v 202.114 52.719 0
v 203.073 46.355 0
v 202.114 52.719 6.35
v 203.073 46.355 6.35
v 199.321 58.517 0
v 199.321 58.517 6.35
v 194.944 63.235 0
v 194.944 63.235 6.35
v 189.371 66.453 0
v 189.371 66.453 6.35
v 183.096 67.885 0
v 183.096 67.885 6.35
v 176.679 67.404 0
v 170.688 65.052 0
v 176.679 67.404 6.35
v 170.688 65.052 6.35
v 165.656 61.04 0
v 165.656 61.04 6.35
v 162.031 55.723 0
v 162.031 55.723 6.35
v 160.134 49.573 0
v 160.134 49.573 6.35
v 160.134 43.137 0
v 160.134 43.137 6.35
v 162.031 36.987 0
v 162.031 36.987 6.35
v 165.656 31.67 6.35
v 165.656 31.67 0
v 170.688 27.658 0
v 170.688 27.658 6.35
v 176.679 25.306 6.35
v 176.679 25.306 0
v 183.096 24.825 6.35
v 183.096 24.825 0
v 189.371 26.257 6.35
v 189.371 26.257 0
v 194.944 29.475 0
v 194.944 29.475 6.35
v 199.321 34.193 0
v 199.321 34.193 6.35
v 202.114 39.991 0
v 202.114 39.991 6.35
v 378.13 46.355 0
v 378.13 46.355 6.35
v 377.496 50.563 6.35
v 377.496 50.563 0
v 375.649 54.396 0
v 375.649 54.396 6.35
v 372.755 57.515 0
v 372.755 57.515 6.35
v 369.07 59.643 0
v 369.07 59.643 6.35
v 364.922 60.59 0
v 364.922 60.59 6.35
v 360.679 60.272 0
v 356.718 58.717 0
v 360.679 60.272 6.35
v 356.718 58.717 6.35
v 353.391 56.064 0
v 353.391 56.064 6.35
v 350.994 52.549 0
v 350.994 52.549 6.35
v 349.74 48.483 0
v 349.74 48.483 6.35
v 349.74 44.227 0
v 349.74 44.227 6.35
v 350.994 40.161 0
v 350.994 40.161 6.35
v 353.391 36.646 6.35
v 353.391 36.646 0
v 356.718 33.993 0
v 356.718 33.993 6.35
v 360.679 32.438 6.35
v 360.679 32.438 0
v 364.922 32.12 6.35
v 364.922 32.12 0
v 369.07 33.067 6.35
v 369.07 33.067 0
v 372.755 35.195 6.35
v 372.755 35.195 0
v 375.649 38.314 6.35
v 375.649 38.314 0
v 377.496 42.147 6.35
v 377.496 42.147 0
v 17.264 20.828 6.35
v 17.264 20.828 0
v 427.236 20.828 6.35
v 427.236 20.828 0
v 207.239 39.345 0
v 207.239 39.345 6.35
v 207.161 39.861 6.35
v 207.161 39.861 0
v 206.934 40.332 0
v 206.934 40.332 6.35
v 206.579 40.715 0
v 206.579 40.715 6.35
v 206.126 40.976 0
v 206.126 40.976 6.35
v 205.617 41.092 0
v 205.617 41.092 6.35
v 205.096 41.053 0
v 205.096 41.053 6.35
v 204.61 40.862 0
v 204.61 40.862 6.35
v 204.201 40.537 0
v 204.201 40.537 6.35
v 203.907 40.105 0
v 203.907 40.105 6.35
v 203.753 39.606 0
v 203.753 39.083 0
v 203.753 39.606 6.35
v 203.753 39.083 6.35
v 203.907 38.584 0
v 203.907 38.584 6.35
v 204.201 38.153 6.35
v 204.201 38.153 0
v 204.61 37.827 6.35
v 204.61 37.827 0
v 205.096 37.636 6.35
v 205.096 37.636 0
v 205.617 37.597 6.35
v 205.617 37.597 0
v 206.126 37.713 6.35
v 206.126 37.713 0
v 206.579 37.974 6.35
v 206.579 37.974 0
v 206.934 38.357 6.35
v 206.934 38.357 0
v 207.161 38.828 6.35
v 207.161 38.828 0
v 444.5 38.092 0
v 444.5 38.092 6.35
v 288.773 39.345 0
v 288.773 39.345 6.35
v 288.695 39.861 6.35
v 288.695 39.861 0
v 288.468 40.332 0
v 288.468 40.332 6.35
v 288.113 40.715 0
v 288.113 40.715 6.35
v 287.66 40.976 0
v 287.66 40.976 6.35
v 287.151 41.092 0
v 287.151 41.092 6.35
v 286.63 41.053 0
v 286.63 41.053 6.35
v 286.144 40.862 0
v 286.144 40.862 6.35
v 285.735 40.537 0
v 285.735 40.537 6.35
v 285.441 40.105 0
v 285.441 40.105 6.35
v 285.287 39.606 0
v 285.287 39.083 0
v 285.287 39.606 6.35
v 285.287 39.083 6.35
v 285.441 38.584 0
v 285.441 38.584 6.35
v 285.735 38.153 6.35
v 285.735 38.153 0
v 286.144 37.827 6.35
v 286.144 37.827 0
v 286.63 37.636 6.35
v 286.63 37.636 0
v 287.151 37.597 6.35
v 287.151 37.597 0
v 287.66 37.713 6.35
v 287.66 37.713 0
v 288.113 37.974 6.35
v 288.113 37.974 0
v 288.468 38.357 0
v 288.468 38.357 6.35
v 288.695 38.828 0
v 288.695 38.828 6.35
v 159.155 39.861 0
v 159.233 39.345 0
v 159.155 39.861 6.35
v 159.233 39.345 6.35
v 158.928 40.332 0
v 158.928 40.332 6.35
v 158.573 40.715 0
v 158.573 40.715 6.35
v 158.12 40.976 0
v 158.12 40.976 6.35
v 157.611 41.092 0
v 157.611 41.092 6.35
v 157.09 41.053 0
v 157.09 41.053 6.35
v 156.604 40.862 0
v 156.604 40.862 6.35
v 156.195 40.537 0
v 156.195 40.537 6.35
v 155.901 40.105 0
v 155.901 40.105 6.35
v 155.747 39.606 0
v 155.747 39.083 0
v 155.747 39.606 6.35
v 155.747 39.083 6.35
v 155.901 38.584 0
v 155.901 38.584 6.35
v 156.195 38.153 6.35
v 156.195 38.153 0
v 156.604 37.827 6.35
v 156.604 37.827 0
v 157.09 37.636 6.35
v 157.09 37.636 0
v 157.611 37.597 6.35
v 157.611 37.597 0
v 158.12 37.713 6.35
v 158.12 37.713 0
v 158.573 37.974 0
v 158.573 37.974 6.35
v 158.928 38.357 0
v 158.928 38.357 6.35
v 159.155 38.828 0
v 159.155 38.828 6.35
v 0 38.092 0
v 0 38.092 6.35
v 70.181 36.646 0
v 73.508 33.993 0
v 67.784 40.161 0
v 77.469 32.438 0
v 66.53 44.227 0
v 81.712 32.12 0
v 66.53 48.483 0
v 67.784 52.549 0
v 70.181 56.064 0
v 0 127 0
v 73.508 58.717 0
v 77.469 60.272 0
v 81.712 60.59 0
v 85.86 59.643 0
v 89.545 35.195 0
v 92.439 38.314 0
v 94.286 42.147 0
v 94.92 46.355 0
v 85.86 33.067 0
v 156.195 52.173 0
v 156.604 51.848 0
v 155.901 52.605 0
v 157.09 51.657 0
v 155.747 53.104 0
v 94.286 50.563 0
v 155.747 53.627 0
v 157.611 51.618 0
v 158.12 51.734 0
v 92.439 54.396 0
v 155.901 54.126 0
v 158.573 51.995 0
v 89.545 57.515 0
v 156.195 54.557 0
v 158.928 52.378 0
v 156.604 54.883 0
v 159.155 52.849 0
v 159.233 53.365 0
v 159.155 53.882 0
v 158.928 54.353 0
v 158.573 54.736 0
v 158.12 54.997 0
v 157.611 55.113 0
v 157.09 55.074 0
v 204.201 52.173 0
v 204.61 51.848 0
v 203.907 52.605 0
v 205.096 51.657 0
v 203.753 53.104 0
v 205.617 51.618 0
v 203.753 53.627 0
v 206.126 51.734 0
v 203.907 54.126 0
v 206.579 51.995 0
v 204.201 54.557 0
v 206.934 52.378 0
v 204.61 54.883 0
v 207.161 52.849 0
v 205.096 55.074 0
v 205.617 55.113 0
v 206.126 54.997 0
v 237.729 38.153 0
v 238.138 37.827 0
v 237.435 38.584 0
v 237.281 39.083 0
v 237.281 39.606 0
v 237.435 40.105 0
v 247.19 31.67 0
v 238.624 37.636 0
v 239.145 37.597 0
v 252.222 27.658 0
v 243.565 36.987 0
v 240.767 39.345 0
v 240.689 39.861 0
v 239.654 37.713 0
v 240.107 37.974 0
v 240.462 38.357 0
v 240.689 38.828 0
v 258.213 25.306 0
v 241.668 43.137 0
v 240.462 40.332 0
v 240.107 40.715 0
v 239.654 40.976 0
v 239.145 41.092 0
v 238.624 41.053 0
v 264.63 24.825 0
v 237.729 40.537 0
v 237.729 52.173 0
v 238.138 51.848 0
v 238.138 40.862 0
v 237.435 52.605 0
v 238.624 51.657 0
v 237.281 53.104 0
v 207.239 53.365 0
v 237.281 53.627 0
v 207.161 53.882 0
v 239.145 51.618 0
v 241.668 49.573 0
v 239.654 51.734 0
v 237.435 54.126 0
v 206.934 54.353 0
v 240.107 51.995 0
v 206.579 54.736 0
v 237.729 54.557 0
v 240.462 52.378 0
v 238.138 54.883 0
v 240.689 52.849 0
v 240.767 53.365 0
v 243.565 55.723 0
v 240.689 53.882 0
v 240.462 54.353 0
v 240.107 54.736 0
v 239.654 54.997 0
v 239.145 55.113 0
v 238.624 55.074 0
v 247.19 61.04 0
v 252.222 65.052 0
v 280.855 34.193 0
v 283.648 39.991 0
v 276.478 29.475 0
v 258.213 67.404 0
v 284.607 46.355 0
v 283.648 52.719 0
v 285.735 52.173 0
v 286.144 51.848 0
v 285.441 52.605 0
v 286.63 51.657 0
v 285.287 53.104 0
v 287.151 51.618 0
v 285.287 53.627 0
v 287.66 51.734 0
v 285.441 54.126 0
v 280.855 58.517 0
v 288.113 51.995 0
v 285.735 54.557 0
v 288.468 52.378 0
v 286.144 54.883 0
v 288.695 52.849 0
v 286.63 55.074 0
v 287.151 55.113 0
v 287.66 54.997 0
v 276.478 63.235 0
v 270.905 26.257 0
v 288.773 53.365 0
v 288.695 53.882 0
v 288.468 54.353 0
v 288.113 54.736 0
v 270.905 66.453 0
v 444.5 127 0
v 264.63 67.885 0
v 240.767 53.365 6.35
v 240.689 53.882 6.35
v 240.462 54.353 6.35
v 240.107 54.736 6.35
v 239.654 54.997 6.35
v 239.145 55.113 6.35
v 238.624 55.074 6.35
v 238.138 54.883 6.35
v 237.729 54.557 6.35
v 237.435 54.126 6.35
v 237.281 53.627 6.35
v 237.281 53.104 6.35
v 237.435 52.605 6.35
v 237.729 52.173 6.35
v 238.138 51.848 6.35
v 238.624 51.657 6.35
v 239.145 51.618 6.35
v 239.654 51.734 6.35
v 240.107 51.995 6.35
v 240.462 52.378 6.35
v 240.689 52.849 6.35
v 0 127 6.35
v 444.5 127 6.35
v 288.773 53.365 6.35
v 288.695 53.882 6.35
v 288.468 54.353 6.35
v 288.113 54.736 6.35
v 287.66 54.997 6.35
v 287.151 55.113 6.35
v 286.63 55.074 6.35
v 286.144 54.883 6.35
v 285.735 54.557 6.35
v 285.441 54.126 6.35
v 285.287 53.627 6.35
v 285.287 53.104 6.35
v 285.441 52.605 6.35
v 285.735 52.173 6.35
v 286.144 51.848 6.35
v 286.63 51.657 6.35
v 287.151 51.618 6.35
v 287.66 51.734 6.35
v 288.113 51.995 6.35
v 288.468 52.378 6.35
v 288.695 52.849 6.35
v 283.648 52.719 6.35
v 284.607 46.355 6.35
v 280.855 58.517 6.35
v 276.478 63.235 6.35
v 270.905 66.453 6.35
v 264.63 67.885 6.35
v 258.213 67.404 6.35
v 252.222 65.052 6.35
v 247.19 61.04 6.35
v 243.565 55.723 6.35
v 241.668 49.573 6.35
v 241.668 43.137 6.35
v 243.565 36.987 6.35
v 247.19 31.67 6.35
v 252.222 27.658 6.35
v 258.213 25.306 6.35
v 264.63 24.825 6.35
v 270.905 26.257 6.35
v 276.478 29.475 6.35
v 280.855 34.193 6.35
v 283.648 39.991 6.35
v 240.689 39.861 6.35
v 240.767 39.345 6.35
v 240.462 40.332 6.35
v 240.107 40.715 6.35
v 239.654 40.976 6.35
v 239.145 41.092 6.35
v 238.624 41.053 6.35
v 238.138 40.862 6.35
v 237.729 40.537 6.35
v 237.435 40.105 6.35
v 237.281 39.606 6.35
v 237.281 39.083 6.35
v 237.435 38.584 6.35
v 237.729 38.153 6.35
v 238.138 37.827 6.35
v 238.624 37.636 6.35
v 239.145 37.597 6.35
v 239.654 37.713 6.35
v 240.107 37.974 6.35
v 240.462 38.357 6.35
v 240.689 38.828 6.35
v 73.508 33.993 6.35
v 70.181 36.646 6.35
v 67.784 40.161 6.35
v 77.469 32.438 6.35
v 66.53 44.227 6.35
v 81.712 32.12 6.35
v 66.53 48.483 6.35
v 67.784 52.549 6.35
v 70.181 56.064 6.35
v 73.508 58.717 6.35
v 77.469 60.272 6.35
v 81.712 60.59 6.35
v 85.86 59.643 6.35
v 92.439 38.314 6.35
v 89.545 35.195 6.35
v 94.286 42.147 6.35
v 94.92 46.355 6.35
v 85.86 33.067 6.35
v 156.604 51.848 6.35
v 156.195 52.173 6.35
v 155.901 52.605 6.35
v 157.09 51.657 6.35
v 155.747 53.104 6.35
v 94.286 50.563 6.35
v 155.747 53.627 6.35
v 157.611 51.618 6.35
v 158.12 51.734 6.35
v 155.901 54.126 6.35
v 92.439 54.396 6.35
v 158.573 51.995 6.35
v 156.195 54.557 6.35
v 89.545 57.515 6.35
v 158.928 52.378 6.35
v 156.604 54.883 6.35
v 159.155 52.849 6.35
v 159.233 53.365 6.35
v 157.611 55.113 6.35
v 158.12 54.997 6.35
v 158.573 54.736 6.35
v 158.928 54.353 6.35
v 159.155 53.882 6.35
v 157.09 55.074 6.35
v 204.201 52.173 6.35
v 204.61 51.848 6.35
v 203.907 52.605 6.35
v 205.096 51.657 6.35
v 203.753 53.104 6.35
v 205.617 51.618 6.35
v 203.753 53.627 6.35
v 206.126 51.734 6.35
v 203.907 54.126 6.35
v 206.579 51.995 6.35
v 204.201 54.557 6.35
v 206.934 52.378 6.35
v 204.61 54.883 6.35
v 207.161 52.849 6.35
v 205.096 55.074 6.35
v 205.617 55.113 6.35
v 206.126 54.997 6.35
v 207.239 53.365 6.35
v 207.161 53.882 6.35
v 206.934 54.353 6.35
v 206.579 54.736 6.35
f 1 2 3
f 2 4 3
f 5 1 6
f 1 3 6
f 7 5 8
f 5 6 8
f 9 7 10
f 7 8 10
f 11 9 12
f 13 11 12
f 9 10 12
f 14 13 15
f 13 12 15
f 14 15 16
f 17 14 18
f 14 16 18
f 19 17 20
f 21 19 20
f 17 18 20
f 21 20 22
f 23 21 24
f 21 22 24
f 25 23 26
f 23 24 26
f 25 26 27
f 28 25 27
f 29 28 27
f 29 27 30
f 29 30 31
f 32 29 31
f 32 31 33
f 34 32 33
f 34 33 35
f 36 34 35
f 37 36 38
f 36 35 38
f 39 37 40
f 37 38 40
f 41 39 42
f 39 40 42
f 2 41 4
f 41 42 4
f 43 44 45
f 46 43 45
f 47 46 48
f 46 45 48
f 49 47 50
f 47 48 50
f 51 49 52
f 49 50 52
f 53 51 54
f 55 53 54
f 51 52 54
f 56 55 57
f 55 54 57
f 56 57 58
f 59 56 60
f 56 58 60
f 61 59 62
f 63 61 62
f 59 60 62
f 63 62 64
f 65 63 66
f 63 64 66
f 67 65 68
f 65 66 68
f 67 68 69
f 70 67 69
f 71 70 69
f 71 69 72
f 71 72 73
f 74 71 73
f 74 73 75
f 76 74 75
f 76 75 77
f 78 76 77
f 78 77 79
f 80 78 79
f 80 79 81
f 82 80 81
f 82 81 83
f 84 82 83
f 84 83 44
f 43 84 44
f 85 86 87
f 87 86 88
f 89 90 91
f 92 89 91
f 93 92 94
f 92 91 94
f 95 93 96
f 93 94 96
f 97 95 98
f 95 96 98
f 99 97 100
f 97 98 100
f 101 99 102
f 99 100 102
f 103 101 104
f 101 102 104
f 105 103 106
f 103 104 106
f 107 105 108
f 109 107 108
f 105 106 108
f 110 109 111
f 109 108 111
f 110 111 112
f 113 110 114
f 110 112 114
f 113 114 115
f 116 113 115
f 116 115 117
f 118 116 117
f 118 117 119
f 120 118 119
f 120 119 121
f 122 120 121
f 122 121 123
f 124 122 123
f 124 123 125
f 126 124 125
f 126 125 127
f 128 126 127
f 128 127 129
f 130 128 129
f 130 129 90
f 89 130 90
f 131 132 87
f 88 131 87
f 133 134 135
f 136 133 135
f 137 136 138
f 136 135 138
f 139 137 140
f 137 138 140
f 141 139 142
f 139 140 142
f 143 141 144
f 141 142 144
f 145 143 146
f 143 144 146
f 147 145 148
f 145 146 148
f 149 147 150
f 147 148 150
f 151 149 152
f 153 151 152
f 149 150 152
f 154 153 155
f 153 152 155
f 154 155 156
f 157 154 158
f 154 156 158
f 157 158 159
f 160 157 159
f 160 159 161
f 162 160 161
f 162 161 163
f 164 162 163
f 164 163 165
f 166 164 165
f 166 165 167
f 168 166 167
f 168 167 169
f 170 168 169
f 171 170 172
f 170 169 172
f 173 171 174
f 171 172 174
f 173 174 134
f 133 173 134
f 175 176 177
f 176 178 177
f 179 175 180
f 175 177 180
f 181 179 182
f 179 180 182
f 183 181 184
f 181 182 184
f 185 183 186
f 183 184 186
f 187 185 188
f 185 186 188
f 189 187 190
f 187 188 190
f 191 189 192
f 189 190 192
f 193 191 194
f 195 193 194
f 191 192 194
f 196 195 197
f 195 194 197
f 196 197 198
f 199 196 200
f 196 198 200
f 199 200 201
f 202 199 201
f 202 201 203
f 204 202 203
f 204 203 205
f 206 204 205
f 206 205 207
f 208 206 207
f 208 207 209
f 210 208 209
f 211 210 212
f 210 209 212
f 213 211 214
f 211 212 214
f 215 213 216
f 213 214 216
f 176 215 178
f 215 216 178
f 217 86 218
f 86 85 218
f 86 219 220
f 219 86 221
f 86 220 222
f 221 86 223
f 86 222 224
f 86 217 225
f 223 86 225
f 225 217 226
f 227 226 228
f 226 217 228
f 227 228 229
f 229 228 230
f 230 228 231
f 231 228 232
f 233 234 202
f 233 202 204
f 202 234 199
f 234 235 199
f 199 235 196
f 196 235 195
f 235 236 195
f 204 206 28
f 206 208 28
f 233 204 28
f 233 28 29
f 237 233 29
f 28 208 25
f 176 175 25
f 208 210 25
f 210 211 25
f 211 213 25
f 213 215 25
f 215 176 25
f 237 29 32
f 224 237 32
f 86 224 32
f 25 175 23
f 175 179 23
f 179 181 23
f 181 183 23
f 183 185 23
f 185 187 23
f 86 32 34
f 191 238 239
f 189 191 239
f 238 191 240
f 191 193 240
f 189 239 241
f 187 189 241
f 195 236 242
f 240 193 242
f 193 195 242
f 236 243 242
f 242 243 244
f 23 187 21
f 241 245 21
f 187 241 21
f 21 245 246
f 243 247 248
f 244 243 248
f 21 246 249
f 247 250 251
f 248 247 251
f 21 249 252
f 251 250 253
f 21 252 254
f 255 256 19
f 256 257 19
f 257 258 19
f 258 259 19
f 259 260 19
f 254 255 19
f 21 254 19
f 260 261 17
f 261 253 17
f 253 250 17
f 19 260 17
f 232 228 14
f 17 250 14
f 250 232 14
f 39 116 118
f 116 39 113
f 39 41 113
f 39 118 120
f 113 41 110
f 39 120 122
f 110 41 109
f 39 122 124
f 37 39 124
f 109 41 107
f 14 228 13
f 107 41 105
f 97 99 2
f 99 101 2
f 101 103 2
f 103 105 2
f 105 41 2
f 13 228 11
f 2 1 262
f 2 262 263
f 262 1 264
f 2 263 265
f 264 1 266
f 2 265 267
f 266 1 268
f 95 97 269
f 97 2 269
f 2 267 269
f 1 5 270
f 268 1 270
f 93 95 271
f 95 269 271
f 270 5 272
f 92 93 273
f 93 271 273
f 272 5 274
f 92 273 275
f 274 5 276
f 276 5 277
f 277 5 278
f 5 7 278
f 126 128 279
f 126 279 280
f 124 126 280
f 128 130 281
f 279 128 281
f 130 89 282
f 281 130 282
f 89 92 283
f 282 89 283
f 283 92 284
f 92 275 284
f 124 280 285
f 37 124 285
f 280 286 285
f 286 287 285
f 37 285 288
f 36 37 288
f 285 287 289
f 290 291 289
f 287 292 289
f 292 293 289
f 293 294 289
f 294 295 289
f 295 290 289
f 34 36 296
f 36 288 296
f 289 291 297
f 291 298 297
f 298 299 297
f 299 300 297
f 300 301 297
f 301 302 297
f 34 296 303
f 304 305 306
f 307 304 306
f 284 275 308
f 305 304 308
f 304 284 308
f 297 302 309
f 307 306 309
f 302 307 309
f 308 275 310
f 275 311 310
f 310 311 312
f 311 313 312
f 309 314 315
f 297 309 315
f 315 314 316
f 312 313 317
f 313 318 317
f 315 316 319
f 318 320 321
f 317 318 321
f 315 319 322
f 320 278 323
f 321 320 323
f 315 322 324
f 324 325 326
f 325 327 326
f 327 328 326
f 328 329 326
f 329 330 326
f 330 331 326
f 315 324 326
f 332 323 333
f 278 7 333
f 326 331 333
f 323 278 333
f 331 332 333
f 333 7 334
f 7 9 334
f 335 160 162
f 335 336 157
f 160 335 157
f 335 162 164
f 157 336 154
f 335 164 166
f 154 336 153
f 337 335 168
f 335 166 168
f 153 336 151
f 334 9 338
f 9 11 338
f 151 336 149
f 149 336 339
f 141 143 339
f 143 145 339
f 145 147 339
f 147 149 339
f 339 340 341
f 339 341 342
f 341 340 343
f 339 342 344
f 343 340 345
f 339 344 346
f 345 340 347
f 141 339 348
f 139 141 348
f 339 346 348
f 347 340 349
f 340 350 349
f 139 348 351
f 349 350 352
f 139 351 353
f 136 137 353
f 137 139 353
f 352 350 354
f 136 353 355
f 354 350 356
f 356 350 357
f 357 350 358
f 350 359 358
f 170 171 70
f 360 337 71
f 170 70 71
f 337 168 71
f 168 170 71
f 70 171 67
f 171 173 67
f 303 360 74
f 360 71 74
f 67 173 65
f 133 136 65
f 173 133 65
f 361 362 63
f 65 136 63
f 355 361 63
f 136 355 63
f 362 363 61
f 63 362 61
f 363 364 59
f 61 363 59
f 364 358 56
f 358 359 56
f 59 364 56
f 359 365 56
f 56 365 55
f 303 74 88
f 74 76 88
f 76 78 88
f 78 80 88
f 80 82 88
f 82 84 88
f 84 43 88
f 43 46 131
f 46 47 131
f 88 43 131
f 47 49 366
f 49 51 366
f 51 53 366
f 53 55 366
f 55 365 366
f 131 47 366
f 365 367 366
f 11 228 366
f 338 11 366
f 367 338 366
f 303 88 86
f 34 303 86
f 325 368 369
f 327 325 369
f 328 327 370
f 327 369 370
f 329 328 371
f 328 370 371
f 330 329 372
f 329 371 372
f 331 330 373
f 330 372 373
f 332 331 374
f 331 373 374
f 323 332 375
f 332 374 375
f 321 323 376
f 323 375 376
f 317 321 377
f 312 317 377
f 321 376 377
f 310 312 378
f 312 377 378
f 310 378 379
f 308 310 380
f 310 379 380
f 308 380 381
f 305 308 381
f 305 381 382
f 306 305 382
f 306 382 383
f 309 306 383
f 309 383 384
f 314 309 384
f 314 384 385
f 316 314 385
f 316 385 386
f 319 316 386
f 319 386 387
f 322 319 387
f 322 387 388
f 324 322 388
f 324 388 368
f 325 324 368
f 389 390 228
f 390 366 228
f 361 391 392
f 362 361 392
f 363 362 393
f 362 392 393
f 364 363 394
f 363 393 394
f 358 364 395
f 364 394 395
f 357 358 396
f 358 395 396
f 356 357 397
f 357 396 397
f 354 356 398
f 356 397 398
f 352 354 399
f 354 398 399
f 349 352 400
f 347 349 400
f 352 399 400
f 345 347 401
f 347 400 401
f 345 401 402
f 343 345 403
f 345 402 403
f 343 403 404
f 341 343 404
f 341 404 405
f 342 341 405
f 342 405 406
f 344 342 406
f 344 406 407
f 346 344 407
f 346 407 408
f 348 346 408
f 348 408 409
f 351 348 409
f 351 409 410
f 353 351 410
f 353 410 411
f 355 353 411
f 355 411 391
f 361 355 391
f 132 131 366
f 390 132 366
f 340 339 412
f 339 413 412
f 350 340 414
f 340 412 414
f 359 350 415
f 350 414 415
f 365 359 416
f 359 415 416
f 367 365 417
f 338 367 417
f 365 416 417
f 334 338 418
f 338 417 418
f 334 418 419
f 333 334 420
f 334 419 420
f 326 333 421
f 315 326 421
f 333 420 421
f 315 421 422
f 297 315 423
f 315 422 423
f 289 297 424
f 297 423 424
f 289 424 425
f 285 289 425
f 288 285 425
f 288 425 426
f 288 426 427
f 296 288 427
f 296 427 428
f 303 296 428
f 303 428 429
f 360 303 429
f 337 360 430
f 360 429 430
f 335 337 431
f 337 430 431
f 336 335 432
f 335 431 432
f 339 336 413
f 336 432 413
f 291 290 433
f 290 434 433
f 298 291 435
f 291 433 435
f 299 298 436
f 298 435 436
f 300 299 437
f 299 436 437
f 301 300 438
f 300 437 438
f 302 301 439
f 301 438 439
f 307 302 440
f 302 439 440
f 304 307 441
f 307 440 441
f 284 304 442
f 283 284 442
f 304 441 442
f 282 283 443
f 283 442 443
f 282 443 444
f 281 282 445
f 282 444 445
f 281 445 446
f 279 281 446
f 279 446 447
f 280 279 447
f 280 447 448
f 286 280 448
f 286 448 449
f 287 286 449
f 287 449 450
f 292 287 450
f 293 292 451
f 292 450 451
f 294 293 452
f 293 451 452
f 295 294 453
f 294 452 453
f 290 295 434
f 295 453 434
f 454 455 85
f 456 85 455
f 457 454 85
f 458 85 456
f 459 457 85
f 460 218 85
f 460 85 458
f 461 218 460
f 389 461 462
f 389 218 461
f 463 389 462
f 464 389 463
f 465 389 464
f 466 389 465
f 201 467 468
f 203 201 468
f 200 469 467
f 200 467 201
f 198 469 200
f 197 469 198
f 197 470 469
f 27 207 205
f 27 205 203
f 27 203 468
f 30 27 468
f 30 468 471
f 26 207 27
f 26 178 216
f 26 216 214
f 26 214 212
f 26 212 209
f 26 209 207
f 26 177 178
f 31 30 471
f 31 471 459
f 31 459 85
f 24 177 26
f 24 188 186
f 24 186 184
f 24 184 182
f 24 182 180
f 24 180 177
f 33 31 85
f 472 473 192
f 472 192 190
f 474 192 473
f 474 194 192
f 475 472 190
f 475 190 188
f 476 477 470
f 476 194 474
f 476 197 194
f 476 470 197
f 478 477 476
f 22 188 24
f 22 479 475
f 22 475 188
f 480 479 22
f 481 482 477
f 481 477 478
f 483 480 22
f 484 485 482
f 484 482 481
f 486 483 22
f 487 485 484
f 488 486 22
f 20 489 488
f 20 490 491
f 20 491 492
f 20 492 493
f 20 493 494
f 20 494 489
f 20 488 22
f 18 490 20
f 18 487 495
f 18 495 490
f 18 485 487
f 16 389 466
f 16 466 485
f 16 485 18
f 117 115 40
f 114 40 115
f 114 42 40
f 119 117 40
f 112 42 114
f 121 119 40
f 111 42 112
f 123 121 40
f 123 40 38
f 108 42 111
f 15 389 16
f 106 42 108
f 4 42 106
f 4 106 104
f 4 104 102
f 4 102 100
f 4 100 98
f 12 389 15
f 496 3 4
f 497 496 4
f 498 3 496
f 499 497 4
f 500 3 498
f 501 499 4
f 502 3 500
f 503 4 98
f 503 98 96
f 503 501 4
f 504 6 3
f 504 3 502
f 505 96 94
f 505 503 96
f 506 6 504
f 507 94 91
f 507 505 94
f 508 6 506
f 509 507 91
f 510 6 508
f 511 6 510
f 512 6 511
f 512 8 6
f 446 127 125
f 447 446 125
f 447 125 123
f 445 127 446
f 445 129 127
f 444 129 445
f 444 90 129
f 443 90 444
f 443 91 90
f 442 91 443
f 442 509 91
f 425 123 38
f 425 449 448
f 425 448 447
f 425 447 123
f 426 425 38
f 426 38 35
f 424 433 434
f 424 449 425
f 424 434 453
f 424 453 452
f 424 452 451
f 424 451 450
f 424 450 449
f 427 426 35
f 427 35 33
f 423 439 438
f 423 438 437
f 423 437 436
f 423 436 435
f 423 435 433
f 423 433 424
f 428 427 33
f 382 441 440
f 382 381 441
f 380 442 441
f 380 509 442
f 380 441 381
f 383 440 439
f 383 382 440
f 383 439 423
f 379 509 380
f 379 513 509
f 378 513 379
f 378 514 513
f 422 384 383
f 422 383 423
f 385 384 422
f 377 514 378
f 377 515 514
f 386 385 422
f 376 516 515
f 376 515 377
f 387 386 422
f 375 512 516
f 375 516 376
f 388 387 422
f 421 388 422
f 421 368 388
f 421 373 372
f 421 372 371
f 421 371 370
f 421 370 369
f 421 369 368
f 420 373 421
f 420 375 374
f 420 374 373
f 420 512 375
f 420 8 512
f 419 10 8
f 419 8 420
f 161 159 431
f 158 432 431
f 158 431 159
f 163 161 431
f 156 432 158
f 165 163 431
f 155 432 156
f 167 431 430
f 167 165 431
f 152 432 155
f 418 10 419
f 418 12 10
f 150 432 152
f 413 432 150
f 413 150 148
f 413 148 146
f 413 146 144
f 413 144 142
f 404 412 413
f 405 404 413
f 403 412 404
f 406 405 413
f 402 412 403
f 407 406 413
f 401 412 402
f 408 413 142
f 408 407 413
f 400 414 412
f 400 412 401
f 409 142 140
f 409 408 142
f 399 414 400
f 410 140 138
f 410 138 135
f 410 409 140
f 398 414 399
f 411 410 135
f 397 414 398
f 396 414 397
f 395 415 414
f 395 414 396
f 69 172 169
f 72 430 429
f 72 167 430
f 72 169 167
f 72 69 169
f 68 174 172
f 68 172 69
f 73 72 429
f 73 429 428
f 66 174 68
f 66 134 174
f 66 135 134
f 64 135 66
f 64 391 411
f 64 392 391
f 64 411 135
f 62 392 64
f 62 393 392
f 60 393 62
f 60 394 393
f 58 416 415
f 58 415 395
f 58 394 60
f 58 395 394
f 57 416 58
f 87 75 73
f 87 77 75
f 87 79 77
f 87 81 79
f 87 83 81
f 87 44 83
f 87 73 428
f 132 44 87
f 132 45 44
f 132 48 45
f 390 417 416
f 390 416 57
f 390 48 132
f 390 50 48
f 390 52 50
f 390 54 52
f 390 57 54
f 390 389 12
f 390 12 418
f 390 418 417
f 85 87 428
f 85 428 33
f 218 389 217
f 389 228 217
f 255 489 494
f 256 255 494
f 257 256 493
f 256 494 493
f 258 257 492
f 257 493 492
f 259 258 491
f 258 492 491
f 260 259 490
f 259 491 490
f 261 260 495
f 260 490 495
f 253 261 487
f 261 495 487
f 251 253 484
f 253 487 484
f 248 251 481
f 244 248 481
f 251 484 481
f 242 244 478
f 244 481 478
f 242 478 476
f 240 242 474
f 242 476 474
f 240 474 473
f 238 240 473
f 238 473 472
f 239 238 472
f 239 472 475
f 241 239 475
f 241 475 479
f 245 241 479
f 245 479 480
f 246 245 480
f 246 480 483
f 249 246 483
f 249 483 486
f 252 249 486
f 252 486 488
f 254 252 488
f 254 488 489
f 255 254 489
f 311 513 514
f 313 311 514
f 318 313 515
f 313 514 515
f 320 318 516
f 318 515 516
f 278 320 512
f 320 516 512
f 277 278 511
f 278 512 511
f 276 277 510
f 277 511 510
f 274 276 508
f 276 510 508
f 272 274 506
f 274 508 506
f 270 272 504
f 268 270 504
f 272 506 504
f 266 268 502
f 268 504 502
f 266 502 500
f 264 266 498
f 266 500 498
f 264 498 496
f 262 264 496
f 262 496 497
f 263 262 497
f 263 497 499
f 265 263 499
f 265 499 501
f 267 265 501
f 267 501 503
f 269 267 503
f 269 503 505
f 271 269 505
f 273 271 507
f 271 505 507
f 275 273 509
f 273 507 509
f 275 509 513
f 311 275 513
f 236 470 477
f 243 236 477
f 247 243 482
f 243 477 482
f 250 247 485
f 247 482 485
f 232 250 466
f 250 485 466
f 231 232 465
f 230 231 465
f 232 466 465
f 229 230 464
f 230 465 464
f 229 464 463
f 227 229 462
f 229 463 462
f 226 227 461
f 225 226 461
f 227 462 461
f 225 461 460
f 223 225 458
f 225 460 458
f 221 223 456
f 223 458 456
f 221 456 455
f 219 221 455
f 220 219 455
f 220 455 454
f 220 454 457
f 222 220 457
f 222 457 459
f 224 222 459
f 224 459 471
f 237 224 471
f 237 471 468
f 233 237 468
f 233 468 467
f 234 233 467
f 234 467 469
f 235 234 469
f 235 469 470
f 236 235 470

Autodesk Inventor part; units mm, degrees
ref_plane "YZ Plane" through (0, 0, 0) normal (1, 0, 0) x (0, 1, 0)
ref_plane "XZ Plane" through (0, 0, 0) normal (0, 1, 0) x (-1, 0, 0)
ref_plane "XY Plane" through (0, 0, 0) normal (0, 0, 1) x (1, 0, 0)
sketch "Sketch1" plane through (0, 0, 0) normal (0, 0, 1) x (1, 0, 0)
  line L0 (0, 0) -> (444.5, 0)
  line L1 (444.5, 0) -> (444.5, 127)
  line L2 (444.5, 127) -> (0, 127)
  line L3 (0, 127) -> (0, 0)
  dimension "d0" = 444.5
  dimension "d1" = 127
extrude "Extrusion1" add sketch "Sketch1" along normal blind 6.35
sketch "Sketch2" plane through (0, 0, 6.35) normal (0, 0, 1) x (1, 0, 0)
  line L0 (0, 0) -> (444.5, 0) projected
  line L1 (38.0923, 0) -> (0, 38.0919)
  line L2 (0, 127) -> (0, 0) projected
  line L3 (0, 0) -> (444.5, 0) projected
  line L4 (444.5, 0) -> (444.5, 127) projected
  line L5 (444.5, 0) -> (406.4, 0)
  line L6 (444.5, 0) -> (482.6, 0) construction
  line L7 (444.5, 0) -> (444.5, 38.0919)
  line L8 (444.5, 38.0919) -> (406.4086, 0)
  point P0 (419.1126, 0)
  dimension "d19" = 38.1
  dimension "d20" = 180
extrude "Extrusion2" cut sketch "Sketch2" against normal blind 50.8
sketch "Sketch3" plane through (0, 0, 6.35) normal (0, 0, 1) x (1, 0, 0)
  line L0 (0, 77.664) -> (80.645, 77.664) construction
  line L1 (444.5, 127) -> (0, 127) projected
  line L2 (80.645, 127) -> (161.29, 127) construction
  circle A0 centre (80.645, 46.355) radius 14.2748
  line L3 (444.5, 38.0919) -> (444.5, 127) projected
  line L4 (444.5, 77.664) -> (525.145, 77.664) construction
  line L5 (444.5, 38.0919) -> (444.5, 127) projected
  line L6 (444.5, 46.355) -> (525.145, 46.355) construction
  circle A1 centre (363.855, 46.355) radius 14.2748
  line L7 (444.5, 127) -> (0, 127) projected
  line L8 (0, 127) -> (0, 38.0919) projected
  circle A2 centre (181.483, 46.355) radius 21.59
  circle A3 centre (263.017, 46.355) radius 21.59
  line L9 (181.483, 46.355) -> (205.486, 46.355)
  line L10 (205.486, 46.355) -> (205.486, 53.3654)
  circle A4 centre (205.486, 53.3654) radius 1.7526
  line L11 (205.486, 46.355) -> (205.486, 39.3446)
  circle A5 centre (205.486, 39.3446) radius 1.7526
  line L12 (181.483, 46.355) -> (157.48, 46.355)
  line L13 (157.48, 46.355) -> (157.48, 53.3654)
  line L14 (157.48, 46.355) -> (157.48, 39.3446)
  circle A6 centre (157.48, 39.3446) radius 1.7526
  circle A7 centre (157.48, 53.3654) radius 1.7526
  line L15 (263.017, 46.355) -> (287.02, 46.355)
  line L16 (263.017, 46.355) -> (239.014, 46.355)
  line L17 (239.014, 46.355) -> (239.014, 53.3654)
  line L18 (239.014, 46.355) -> (239.014, 39.3446)
  line L19 (287.02, 46.355) -> (287.02, 39.3446)
  line L20 (287.02, 46.355) -> (287.02, 53.3654)
  circle A8 centre (287.02, 53.3654) radius 1.7526
  circle A9 centre (287.02, 39.3446) radius 1.7526
  circle A10 centre (239.014, 39.3446) radius 1.7526
  circle A11 centre (239.014, 53.3654) radius 1.7526
  line L21 (263.017, 46.355) -> (256.667, 46.355)
  line L22 (406.4086, 0) -> (444.5, 38.0919) projected
  line L23 (444.5, 38.0919) -> (444.5, 127) projected
  line L24 (444.5, 127) -> (0, 127) projected
  line L25 (0, 127) -> (0, 38.0919) projected
  line L26 (0, 38.0919) -> (38.0923, 0) projected
  line L27 (38.0923, 0) -> (406.4086, 0) projected
  line L28 (406.4086, 0) -> (444.5, 38.0919) projected
  line L29 (444.5, 38.0919) -> (444.5, 127) projected
  line L30 (444.5, 127) -> (0, 127) projected
  line L31 (0, 127) -> (0, 38.0919) projected
  line L32 (0, 38.0919) -> (38.0923, 0) projected
  line L33 (38.0923, 0) -> (406.4086, 0) projected
  line L34 (38.0923, 0) -> (0, 38.0919) projected
  line L35 (0, 38.0919) -> (0, 127) projected
  line L36 (0, 127) -> (444.5, 127) projected
  line L37 (444.5, 127) -> (444.5, 38.0919) projected
  line L38 (444.5, 38.0919) -> (406.4086, 0) projected
  line L39 (406.4086, 0) -> (38.0923, 0) projected
  point P0 (0, 0)
  dimension "d10" = 28.5496
  dimension "d18" = 28.5496
  dimension "d31" = 43.18
  dimension "d32" = 43.18
  dimension "d55" = 24.003
  dimension "d56" = 7.0104
  dimension "d57" = 3.5052
  dimension "d58" = 7.0104
  dimension "d59" = 3.5052
  dimension "d60" = 24.003
  dimension "d61" = 7.0104
  dimension "d62" = 7.0104
  dimension "d63" = 3.5052
  dimension "d64" = 3.5052
  dimension "d65" = 24.003
  dimension "d66" = 24.003
  dimension "d67" = 3.5052
  dimension "d68" = 3.5052
  dimension "d69" = 3.5052
  dimension "d70" = 3.5052
  dimension "d73" = 6.35
  dimension "d74" = 181.483
  dimension "d75" = 181.483
extrude "Extrusion3" cut sketch "Sketch3" against normal blind 50.8 contours A0 | A1
extrude "Extrusion4" cut sketch "Sketch3" against normal blind 25.4 contours L9 L12 A2 | A2 L12 L9 | L15 L16 A3 | A3 L16 L15
thicken "Thicken1" operation add thickness 20.828 both sides no extend neighbours yes toward (0, 1, 0) faces at (160.8644, 0, 2.1167)
extrude "Extrusion6" cut sketch "Sketch3" against normal blind 25.4 contours A4 | A5 | A6 | A7 | A8 | A9 | A10 | A11
properties part number "MecanumDriveTrainPlate17-18"
